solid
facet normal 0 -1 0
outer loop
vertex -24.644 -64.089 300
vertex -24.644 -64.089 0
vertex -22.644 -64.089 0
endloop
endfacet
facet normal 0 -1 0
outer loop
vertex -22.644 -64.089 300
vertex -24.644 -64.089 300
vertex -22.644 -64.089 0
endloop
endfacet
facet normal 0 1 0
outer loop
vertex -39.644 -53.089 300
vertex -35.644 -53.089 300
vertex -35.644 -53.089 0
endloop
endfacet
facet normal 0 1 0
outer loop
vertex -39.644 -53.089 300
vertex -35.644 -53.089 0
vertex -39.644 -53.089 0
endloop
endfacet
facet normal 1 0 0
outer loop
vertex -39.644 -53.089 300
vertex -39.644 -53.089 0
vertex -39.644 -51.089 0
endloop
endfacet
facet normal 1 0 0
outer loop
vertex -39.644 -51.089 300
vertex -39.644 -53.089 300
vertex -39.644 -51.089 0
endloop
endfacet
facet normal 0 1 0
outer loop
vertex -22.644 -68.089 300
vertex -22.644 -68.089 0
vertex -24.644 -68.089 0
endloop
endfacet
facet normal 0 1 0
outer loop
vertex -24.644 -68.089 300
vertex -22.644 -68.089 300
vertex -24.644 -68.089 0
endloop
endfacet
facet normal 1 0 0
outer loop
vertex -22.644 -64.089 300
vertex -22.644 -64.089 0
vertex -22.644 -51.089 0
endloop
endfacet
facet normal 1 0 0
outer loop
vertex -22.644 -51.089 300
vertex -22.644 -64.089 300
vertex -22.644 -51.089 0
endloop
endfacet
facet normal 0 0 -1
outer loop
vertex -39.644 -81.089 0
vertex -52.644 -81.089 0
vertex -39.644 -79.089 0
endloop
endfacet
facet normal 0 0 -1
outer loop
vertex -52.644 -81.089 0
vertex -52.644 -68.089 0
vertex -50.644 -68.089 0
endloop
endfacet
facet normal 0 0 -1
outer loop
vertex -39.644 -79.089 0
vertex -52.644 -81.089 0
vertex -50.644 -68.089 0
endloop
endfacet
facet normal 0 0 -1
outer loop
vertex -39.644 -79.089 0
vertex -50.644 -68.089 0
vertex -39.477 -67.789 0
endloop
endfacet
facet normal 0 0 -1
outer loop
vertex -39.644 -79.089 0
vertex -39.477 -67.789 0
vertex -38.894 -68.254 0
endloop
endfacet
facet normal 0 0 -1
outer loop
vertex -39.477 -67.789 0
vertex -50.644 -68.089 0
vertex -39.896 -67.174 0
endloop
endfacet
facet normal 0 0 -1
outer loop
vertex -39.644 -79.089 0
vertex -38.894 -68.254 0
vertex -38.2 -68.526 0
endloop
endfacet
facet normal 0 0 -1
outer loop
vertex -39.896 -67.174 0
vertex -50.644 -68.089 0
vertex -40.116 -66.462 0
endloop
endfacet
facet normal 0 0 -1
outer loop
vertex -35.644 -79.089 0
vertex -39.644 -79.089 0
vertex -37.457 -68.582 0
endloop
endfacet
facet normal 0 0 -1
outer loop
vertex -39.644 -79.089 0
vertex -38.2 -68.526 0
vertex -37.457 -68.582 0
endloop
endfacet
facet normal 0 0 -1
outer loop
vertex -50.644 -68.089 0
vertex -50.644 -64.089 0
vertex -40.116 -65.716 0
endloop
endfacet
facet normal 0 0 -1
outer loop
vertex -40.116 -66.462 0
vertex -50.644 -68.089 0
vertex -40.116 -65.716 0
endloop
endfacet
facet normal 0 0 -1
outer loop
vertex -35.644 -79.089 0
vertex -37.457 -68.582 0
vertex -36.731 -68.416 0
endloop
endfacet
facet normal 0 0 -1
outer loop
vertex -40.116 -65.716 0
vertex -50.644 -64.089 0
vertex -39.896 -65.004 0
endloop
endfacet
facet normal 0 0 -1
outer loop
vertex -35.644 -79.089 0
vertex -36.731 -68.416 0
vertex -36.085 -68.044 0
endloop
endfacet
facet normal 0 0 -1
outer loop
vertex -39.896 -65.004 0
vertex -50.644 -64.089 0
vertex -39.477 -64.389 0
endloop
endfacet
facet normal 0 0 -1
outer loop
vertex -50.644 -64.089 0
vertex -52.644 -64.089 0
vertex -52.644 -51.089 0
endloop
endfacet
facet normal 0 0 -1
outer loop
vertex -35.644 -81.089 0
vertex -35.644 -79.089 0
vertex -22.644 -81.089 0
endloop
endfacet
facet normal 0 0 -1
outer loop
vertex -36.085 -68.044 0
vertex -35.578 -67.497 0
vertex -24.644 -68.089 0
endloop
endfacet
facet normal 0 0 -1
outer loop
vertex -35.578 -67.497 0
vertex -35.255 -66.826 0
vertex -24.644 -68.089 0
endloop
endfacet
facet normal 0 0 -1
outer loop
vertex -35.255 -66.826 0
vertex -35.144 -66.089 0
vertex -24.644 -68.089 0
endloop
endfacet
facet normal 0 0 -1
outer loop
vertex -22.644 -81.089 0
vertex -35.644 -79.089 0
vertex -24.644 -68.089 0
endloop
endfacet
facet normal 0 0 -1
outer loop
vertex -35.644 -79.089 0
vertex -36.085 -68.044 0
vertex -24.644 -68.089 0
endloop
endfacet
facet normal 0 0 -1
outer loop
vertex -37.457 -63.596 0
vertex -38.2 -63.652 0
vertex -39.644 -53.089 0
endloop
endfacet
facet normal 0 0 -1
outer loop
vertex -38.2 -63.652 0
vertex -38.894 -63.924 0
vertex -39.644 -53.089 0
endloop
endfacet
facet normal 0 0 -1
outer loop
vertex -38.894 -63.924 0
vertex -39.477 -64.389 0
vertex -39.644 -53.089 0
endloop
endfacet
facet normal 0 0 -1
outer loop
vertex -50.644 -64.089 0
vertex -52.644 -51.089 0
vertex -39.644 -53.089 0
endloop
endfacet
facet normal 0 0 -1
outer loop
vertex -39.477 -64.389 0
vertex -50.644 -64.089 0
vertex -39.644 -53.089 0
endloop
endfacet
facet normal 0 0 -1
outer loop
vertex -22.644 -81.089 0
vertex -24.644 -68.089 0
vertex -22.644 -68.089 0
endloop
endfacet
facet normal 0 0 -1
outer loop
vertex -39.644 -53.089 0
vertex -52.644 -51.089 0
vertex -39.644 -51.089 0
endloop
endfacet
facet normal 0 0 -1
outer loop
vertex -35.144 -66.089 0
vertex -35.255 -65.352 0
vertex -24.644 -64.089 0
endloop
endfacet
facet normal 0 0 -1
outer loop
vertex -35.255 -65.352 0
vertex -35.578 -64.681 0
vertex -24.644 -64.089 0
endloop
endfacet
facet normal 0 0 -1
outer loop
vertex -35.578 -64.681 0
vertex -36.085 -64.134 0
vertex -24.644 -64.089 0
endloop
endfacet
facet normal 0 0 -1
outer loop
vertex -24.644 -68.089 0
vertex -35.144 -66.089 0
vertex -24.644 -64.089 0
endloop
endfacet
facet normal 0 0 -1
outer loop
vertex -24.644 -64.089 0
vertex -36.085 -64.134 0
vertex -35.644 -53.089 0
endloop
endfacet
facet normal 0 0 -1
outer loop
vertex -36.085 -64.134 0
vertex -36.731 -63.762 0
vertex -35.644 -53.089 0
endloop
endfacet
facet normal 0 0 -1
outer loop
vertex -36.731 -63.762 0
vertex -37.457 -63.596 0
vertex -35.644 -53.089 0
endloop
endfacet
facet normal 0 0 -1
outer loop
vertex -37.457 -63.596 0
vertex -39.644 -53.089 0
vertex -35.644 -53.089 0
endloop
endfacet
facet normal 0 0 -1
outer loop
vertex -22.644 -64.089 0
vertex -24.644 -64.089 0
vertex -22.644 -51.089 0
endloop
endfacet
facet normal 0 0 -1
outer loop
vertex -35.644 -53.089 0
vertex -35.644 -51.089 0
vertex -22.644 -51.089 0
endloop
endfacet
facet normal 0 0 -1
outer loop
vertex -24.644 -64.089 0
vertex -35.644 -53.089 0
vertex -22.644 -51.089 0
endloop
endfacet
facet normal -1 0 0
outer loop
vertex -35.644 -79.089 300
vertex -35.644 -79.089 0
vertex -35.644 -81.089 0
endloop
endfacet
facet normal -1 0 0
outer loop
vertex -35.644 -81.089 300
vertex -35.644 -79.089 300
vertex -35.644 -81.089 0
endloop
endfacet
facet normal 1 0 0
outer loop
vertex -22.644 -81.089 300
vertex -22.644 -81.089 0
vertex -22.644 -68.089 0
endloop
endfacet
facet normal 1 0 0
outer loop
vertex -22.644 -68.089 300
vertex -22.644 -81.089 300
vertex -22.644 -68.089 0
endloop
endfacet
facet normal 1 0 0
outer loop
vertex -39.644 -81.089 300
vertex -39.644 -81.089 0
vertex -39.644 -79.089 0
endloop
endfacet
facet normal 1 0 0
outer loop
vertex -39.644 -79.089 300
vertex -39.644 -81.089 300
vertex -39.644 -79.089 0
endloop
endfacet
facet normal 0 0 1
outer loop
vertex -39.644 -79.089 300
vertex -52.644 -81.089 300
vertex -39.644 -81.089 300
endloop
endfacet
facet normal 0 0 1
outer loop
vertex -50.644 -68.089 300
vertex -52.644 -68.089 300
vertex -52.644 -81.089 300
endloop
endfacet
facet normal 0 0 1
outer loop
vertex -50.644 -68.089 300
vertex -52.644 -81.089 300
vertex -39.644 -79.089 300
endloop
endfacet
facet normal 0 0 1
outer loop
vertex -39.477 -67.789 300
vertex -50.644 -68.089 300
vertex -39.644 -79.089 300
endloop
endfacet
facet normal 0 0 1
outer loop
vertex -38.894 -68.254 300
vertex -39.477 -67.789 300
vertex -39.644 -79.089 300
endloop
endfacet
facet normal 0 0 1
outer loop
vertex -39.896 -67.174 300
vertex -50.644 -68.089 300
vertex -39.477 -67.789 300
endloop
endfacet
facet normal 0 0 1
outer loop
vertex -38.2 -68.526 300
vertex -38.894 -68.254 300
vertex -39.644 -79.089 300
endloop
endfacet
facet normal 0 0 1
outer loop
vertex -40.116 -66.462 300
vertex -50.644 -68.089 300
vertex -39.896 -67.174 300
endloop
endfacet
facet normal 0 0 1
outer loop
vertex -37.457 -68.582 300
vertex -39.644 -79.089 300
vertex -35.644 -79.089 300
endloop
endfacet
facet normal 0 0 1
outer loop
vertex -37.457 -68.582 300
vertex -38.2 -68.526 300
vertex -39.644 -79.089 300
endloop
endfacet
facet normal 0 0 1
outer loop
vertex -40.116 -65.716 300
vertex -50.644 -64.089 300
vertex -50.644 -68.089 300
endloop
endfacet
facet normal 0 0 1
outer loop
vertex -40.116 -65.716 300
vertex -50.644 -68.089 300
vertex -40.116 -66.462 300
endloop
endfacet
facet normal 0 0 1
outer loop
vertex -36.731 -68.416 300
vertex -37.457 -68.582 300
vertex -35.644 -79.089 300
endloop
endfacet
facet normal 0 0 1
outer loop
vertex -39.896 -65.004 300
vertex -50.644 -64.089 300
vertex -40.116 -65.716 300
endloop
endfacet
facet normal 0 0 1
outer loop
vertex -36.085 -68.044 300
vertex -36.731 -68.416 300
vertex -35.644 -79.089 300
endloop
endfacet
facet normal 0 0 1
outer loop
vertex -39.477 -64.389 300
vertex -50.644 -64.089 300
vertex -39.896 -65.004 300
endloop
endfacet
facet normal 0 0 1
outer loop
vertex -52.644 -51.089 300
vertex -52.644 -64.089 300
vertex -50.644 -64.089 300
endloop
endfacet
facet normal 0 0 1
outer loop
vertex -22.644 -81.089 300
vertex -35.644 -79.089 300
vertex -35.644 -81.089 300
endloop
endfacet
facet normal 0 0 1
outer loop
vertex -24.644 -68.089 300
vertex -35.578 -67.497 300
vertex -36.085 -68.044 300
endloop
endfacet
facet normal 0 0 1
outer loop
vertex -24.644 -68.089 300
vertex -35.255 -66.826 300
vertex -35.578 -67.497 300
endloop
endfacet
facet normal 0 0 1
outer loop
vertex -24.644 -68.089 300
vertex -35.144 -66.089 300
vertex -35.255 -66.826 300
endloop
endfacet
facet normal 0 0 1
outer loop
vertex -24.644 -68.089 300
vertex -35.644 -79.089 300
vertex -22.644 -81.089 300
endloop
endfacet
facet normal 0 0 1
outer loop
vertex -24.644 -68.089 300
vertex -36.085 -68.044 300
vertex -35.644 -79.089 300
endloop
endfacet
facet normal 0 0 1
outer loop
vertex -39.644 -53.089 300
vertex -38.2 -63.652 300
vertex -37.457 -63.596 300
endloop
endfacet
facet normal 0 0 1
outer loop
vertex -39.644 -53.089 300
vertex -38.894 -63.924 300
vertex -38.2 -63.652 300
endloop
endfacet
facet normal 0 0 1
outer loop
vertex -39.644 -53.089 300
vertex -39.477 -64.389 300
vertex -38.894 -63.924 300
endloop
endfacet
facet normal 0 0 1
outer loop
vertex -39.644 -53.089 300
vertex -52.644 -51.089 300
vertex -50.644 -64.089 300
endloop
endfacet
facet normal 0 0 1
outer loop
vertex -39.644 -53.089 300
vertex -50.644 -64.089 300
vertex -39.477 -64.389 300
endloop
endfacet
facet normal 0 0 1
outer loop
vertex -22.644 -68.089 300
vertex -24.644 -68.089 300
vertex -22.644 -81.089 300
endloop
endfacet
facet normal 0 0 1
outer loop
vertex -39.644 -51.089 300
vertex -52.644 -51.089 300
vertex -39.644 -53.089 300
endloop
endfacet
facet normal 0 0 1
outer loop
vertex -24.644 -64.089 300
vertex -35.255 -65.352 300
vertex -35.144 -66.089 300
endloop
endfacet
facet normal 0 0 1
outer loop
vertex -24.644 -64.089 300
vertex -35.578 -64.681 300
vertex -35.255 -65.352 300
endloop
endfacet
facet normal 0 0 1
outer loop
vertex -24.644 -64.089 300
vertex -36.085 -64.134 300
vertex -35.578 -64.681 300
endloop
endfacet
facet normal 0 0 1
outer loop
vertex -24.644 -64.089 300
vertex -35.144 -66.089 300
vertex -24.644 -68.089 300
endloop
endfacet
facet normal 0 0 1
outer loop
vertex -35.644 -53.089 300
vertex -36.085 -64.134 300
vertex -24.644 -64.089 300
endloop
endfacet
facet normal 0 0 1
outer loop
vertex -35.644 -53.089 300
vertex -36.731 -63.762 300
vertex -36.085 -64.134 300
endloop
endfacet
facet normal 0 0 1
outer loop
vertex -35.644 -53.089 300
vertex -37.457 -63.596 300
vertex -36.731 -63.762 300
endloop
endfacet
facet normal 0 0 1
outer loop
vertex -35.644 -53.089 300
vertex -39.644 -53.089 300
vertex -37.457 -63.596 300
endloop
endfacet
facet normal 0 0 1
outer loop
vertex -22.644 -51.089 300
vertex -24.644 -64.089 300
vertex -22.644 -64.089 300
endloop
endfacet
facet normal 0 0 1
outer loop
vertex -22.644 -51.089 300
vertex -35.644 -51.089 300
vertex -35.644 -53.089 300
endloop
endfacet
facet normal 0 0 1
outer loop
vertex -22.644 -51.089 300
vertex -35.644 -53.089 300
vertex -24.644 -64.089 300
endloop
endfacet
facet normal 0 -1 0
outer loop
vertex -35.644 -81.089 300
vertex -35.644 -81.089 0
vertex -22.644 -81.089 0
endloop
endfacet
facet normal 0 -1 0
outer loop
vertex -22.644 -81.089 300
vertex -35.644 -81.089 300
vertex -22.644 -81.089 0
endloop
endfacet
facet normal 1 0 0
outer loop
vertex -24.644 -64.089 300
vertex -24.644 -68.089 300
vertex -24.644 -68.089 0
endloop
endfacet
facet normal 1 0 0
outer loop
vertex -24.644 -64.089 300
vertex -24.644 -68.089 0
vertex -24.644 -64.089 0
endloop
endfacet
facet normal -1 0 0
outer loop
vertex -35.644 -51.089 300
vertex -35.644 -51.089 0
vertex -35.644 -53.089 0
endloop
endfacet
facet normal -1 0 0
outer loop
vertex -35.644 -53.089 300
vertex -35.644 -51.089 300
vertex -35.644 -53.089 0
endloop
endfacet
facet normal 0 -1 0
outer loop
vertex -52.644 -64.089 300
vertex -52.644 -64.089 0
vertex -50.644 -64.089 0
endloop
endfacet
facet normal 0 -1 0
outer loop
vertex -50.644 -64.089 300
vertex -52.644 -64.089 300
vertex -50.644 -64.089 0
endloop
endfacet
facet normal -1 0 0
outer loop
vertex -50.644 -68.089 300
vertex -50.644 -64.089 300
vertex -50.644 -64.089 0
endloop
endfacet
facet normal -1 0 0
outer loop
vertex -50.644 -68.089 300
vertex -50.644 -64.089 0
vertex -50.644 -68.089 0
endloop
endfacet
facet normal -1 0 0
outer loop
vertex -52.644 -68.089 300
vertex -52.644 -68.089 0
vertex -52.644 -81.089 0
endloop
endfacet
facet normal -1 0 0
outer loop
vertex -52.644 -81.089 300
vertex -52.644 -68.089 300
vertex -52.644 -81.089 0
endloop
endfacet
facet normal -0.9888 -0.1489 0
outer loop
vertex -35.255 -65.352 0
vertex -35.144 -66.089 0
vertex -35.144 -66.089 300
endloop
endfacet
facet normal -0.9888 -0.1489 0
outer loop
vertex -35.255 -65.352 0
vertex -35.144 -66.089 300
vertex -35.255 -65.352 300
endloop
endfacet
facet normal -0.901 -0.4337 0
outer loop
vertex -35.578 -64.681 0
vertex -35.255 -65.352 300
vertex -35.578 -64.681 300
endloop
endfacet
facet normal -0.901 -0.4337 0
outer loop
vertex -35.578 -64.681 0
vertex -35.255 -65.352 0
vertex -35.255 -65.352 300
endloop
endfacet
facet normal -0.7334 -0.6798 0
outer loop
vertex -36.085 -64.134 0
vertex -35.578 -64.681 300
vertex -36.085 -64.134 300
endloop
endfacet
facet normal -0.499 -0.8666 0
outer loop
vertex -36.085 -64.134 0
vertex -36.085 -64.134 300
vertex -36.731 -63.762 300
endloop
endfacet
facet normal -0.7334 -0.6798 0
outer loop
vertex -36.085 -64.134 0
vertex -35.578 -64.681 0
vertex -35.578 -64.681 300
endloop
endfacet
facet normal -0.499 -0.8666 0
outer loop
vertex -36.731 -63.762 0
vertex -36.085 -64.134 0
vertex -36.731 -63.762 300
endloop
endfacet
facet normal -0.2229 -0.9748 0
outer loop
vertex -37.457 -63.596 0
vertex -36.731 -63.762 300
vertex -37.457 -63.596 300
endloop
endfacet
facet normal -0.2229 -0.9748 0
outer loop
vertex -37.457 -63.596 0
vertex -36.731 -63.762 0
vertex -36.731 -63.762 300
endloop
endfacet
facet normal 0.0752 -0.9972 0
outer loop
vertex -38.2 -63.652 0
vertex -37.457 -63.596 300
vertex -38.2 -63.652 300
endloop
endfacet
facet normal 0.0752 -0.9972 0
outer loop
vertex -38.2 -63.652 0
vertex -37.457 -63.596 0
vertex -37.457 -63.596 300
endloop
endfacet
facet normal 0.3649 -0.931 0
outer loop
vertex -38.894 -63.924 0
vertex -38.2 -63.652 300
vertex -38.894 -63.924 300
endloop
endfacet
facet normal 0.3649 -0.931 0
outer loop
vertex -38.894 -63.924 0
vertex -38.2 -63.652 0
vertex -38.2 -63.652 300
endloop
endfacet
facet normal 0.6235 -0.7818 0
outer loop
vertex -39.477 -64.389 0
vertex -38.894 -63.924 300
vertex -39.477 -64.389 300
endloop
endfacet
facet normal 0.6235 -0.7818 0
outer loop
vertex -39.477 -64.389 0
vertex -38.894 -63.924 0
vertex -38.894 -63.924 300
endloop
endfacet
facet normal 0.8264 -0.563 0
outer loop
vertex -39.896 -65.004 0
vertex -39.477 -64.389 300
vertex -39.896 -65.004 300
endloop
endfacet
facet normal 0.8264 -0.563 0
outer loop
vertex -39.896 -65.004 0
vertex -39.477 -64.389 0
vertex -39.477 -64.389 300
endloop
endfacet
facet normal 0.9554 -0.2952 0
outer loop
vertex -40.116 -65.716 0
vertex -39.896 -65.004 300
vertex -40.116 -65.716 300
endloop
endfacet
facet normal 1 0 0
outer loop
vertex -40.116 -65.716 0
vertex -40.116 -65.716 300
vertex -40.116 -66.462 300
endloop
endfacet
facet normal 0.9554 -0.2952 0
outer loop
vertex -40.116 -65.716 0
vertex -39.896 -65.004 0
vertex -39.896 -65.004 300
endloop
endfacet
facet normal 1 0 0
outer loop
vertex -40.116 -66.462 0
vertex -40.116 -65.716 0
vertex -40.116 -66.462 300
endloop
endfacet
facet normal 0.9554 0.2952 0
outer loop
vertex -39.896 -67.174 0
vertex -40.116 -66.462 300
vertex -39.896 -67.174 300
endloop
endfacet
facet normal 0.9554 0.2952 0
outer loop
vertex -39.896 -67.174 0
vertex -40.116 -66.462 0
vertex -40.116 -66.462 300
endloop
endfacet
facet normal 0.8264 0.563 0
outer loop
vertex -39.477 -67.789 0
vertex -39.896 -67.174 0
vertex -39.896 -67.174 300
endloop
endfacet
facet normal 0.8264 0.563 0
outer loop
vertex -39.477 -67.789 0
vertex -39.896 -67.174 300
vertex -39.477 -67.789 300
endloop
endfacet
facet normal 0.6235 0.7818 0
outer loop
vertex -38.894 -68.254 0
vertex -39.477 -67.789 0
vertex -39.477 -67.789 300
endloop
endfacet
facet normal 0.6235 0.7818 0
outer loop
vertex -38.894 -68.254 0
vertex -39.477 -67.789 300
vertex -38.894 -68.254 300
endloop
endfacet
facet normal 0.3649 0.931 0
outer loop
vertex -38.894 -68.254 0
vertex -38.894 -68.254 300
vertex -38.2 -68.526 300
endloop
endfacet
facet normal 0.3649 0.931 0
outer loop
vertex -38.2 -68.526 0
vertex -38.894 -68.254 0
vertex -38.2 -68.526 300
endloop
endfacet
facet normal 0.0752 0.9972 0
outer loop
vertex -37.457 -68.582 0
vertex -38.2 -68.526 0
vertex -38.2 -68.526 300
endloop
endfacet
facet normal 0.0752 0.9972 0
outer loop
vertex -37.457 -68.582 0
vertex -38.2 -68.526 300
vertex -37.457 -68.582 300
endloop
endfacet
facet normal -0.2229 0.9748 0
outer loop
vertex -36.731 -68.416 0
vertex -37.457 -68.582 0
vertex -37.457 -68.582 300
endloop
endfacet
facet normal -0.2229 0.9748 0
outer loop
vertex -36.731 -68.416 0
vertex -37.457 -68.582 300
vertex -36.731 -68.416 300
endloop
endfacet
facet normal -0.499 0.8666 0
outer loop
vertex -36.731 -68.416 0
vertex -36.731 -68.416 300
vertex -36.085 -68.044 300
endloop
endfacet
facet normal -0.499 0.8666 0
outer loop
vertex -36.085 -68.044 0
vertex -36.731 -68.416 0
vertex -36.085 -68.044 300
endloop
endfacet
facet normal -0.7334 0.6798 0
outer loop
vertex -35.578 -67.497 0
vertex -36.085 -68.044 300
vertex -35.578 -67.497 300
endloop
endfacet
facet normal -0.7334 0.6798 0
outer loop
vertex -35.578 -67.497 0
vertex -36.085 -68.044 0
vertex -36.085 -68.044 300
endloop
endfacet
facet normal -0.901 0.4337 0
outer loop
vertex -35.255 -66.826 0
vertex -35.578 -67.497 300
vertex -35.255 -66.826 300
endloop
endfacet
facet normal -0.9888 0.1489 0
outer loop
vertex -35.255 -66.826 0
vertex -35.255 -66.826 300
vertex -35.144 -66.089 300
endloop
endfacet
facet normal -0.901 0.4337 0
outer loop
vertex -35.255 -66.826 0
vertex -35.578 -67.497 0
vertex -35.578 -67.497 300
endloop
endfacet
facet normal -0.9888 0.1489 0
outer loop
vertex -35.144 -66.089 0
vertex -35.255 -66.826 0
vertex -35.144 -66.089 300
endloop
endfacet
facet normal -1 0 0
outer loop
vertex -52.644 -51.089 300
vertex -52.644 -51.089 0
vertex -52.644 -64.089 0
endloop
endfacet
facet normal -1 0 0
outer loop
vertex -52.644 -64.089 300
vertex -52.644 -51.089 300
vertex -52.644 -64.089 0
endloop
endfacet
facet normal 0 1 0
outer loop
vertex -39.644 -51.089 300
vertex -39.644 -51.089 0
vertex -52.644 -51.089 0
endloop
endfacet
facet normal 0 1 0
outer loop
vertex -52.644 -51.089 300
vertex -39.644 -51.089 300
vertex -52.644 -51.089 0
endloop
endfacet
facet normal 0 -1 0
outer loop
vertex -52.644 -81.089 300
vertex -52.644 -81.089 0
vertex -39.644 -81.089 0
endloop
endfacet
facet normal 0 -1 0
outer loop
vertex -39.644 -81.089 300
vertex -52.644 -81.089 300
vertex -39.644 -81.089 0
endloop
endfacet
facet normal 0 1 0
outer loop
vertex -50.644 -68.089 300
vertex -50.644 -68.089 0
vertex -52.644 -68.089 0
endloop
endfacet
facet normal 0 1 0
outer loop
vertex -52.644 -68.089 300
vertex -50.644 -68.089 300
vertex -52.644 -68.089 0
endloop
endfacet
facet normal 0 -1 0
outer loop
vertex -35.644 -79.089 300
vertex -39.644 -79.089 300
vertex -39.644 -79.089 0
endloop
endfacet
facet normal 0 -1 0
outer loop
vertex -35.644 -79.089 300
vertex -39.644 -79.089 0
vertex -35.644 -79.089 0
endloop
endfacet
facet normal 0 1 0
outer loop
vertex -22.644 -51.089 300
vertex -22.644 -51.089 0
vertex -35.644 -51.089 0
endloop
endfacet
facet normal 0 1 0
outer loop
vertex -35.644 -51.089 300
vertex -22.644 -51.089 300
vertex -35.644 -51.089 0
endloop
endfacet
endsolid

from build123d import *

# Parameters (mm, degrees)
F0_R     = 2.5
F1_DEPTH = 300


with BuildPart() as f1:
    # F0 (on Top) → F1 (new body)
    with BuildSketch(Plane.XY):
        Polygon((-52.643933, -68.08899), (-52.643933, -81.08899), (-39.643933, -81.08899), (-39.643933, -79.08899), (-35.643933, -79.08899), (-35.643933, -81.08899), (-22.643933, -81.08899), (-22.643933, -68.08899), (-24.643933, -68.08899), (-24.643933, -64.08899), (-22.643933, -64.08899), (-22.643933, -51.08899), (-35.643933, -51.08899), (-35.643933, -53.08899), (-39.643933, -53.08899), (-39.643933, -51.08899), (-52.643933, -51.08899), (-52.643933, -64.08899), (-50.643933, -64.08899), (-50.643933, -68.08899), align=None)
        with Locations((-37.643933, -66.08899)):
            Circle(F0_R, mode=Mode.SUBTRACT)
    extrude(amount=F1_DEPTH)


solid = f1.part
